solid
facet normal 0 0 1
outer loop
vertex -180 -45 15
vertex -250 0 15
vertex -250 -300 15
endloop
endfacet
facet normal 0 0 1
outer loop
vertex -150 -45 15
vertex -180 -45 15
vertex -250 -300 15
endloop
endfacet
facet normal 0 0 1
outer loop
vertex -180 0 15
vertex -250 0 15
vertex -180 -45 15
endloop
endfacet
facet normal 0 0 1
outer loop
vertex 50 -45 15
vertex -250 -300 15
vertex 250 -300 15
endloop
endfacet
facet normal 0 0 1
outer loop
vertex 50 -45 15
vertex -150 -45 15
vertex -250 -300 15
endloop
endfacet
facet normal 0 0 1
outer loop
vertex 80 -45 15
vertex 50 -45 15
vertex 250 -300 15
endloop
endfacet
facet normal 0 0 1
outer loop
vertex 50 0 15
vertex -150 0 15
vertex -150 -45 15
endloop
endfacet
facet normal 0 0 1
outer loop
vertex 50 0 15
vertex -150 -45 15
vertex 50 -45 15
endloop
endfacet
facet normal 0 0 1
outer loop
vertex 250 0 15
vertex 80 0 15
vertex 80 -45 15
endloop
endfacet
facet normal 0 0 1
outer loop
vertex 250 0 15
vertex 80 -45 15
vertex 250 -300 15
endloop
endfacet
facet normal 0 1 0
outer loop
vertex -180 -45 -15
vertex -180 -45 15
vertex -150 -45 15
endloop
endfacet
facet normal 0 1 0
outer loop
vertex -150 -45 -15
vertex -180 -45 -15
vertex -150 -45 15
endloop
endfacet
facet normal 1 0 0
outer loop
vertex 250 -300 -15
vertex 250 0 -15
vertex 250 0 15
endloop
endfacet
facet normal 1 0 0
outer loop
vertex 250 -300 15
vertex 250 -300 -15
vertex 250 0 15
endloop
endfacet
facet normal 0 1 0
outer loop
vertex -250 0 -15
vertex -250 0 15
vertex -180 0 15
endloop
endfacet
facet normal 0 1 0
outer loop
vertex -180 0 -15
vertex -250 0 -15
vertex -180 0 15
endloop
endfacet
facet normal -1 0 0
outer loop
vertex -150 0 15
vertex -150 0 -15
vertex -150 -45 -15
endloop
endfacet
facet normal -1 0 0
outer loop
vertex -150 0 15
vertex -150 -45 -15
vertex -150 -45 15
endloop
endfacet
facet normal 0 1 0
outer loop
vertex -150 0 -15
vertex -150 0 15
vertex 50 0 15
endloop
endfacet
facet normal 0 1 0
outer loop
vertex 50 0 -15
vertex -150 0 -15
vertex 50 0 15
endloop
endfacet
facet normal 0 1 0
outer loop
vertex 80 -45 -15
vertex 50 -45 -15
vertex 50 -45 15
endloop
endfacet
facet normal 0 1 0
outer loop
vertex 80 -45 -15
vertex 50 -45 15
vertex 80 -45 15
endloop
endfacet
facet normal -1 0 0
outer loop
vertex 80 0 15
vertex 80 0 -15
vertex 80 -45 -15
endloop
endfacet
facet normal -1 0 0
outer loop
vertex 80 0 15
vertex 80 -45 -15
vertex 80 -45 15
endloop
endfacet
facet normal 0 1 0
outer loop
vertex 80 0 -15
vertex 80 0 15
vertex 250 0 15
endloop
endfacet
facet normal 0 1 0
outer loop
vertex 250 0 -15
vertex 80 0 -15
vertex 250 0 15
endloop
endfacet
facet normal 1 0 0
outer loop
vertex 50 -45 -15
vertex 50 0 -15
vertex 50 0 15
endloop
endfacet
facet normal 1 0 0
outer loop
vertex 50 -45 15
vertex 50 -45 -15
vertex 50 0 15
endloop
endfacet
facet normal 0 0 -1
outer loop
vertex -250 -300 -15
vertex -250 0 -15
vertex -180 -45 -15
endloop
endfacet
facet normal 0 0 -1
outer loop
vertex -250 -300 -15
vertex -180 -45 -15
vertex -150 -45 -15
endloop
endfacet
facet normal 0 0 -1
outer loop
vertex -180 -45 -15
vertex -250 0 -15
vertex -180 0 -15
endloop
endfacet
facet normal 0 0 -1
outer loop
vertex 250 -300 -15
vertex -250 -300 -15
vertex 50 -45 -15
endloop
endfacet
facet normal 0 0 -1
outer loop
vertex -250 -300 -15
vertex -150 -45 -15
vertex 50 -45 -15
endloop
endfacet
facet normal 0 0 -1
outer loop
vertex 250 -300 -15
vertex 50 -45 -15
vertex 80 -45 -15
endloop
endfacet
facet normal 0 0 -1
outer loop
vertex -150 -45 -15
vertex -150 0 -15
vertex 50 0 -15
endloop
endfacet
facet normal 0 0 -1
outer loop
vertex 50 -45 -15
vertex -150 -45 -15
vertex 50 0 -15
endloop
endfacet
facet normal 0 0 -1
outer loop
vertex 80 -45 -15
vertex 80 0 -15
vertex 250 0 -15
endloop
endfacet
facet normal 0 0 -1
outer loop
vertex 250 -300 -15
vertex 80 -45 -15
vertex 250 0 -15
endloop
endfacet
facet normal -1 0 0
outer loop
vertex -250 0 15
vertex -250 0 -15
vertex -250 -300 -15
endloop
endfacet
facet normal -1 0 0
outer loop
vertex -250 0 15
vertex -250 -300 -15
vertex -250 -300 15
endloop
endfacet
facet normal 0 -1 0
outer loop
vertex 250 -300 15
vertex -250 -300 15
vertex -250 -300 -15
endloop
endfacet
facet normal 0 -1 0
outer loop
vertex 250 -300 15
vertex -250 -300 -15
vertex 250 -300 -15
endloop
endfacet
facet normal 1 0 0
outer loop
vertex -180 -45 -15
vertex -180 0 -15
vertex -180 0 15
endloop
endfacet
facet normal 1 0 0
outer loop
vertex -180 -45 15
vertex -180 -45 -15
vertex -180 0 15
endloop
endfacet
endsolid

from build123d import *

# Parameters (mm, degrees)
F0_W     = 500
F0_H     = 30
F1_DEPTH = 300
F2_W     = 30
F2_H     = 30.000001
F3_DEPTH = 45
F4_W     = 30
F4_H     = 30
F5_DEPTH = 45


with BuildPart() as f1:
    # F0 (on Front) → F1 (new body)
    with BuildSketch(Plane.XZ):
        Rectangle(F0_W, F0_H)
    extrude(amount=F1_DEPTH)

    # F2 (on Front) → F3 (cut)
    with BuildSketch(Plane.XZ):
        with Locations((65, 0)):
            Rectangle(F2_W, F2_H)
    extrude(amount=F3_DEPTH, mode=Mode.SUBTRACT)

    # F4 (on Front) → F5 (cut)
    with BuildSketch(Plane.XZ):
        with Locations((-165, 0)):
            Rectangle(F4_W, F4_H)
    extrude(amount=F5_DEPTH, mode=Mode.SUBTRACT)


solid = f1.part
